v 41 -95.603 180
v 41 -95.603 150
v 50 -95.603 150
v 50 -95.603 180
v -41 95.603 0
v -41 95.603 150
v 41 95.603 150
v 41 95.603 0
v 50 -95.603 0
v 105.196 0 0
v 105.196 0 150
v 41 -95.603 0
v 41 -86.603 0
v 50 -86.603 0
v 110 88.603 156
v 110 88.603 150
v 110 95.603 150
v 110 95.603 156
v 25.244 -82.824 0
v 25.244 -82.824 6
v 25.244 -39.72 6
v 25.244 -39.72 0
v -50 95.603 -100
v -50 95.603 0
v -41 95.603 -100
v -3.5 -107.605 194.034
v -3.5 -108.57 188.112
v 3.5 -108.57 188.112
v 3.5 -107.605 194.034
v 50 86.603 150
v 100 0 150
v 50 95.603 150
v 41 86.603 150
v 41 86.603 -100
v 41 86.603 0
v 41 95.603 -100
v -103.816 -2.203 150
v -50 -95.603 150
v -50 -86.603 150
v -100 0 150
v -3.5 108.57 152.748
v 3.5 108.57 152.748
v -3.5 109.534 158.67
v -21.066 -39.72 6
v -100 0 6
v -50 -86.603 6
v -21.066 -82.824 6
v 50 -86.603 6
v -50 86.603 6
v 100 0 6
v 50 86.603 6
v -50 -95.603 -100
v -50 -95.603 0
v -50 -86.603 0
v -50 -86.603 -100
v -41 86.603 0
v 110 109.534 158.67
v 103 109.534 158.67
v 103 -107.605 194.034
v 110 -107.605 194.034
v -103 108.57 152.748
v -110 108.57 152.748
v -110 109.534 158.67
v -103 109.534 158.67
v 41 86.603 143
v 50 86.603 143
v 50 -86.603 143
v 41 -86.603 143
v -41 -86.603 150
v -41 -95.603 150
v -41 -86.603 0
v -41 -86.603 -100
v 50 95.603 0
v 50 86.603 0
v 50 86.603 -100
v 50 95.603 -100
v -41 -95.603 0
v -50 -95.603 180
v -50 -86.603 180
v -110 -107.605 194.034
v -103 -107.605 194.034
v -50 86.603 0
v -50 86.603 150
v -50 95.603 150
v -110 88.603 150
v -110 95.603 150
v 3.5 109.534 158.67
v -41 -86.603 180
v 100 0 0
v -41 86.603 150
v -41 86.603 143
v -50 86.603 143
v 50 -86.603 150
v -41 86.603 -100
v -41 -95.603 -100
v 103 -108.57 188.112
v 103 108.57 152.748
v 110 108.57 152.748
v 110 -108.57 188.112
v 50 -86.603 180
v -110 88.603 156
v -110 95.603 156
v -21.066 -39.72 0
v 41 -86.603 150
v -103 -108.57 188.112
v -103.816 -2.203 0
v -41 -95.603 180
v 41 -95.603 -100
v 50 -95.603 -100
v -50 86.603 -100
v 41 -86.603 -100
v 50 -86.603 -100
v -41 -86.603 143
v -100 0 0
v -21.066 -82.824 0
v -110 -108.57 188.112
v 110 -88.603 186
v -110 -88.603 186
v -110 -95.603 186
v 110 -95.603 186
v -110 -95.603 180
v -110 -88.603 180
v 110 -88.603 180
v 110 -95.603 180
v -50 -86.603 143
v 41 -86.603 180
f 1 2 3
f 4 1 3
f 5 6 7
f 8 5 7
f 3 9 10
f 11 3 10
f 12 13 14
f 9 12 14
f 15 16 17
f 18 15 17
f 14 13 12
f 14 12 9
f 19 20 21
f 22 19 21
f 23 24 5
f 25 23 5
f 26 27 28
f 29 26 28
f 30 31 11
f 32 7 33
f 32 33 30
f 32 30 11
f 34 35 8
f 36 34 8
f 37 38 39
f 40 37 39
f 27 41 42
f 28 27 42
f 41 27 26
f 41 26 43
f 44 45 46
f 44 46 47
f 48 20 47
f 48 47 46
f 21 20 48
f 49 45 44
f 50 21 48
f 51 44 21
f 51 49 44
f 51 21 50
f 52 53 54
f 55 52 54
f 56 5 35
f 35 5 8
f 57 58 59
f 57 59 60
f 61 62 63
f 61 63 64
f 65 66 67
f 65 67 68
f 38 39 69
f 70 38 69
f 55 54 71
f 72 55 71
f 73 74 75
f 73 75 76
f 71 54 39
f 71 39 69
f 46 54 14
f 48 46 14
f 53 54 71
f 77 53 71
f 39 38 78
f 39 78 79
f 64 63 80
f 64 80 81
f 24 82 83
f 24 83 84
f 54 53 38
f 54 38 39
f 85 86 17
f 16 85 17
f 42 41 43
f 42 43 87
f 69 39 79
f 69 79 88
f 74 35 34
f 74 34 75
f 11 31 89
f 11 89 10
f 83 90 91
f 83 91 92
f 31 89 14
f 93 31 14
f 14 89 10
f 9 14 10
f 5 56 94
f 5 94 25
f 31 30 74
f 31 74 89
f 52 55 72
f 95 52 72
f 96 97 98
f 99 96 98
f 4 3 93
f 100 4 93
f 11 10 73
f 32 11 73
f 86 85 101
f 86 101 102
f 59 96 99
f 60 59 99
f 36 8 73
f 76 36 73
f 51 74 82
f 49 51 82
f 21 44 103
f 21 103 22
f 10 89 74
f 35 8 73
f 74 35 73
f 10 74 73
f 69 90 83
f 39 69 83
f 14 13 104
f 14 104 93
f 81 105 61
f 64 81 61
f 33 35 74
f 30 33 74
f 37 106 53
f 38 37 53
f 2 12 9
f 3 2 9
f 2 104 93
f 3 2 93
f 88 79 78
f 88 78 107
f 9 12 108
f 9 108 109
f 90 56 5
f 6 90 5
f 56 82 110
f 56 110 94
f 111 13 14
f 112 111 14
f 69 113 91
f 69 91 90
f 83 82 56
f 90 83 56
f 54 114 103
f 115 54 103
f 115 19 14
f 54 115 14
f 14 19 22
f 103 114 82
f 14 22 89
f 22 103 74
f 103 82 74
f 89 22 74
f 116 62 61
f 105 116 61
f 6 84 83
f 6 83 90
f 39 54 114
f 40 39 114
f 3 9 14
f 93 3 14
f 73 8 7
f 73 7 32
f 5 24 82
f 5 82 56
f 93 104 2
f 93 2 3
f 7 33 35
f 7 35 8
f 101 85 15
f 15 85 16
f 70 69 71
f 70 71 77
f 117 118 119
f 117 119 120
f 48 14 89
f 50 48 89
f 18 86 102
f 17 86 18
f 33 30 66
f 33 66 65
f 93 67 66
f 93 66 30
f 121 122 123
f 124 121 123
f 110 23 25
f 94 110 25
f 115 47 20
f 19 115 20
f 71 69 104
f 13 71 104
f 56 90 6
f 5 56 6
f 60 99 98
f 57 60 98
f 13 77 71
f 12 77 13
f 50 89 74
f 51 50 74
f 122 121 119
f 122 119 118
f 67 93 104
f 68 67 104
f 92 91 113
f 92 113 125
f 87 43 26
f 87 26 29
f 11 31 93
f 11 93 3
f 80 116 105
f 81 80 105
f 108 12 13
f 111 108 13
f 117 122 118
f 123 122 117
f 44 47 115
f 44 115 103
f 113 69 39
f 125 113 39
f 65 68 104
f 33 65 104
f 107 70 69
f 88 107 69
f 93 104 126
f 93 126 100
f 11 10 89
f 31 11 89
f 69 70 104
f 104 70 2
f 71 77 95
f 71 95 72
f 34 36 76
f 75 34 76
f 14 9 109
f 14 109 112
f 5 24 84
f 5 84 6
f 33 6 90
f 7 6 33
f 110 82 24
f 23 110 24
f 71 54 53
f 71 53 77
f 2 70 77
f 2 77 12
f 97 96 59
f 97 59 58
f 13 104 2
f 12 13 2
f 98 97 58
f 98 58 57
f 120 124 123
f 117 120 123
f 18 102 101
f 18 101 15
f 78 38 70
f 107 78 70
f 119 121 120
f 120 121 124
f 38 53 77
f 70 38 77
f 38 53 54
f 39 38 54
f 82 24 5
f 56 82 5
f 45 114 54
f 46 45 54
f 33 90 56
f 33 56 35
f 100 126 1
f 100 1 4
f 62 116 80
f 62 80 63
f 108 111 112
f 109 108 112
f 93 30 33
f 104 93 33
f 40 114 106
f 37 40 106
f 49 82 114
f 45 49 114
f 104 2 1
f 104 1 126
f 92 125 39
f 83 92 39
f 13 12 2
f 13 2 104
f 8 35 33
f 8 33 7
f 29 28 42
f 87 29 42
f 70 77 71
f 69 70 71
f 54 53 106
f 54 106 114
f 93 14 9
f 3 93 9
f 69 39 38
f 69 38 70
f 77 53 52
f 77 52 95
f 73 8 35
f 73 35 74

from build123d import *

# Parameters (mm, degrees)
F1_DEPTH  = 6
F2_W      = 9
F2_H      = 9
F3_DEPTH  = 150
F5_W      = 82
F5_H      = 9
F6_DEPTH  = 150
F8_DEPTH  = 100
F10_DEPTH = 150
F12_W     = 46.3100634515
F12_H     = 43.1039780378
F13_DEPTH = 6
F16_DEPTH = 150
F17_DEPTH = 150
F18_W     = 9
F18_H     = 7
F19_DEPTH = 173.2050807569
F20_W     = 220
F20_H     = 7
F21_DEPTH = 6
F22_W     = 9
F22_H     = 9
F23_DEPTH = 30
F24_W     = 220
F24_H     = 7
F25_DEPTH = 6
F27_W     = 7
F27_H     = 220
F28_DEPTH = 6


with BuildPart() as f1:
    # F0 (on Top) → F1 (new body)
    with BuildSketch(Plane.XY):
        Polygon((100, 0), (50, 86.6025403784), (-50, 86.6025403784), (-100, 0), (-50, -86.6025403784), (50, -86.6025403784), align=None)
    extrude(amount=F1_DEPTH)

    # F12 (on face) → F13 (cut, through all)
    with BuildSketch(Plane.XY.offset(6)):
        with Locations((2.0888131112, -61.2717717886)):
            Rectangle(F12_W, F12_H)
    extrude(amount=-F13_DEPTH, mode=Mode.SUBTRACT)


with BuildPart() as f3:
    # F2 (on Top) → F3 (new body)
    with BuildSketch(Plane.XY):
        with Locations((-45.5, 91.1025403784)):
            Rectangle(F2_W, F2_H)
    extrude(amount=F3_DEPTH)


with BuildPart() as f3b:
    # F2 (on Top) → F3, piece 2 (new body)
    with BuildSketch(Plane.XY):
        with Locations((45.5, 91.1025403784)):
            Rectangle(F2_W, F2_H)
    extrude(amount=F3_DEPTH)

    # F9 (on offset) → F10 (join)
    with BuildSketch(Plane.XY.offset(150)):
        Polygon((50, 95.6025403784), (50, 86.6025403784), (100, 0), (105.1961524227, 0), align=None)
    extrude(amount=-F10_DEPTH)


with BuildPart() as f3c:
    # F2 (on Top) → F3, piece 3 (new body)
    with BuildSketch(Plane.XY):
        with Locations((-45.5, -91.1025403784)):
            Rectangle(F2_W, F2_H)
    extrude(amount=F3_DEPTH)


with BuildPart() as f3d:
    # F2 (on Top) → F3, piece 4 (new body)
    with BuildSketch(Plane.XY):
        with Locations((45.5, -91.1025403784)):
            Rectangle(F2_W, F2_H)
    extrude(amount=F3_DEPTH)


with BuildPart() as f6:
    # F5 (on offset) → F6 (new body)
    with BuildSketch(Plane.XY.offset(150)):
        with Locations((0, 91.1025403784)):
            Rectangle(F5_W, F5_H)
    extrude(amount=-F6_DEPTH)


with BuildPart() as f7_1:
    # F7: instance of F6
    add(f6.part.mirror(Plane.XZ))


with BuildPart() as f8:
    # F2 (on Top) → F8 (new body)
    with BuildSketch(Plane.XY):
        with Locations((-45.5, 91.1025403784)):
            Rectangle(F2_W, F2_H)
    extrude(amount=-F8_DEPTH)


with BuildPart() as f8b:
    # F2 (on Top) → F8, piece 2 (new body)
    with BuildSketch(Plane.XY):
        with Locations((45.5, 91.1025403784)):
            Rectangle(F2_W, F2_H)
    extrude(amount=-F8_DEPTH)


with BuildPart() as f8c:
    # F2 (on Top) → F8, piece 3 (new body)
    with BuildSketch(Plane.XY):
        with Locations((-45.5, -91.1025403784)):
            Rectangle(F2_W, F2_H)
    extrude(amount=-F8_DEPTH)


with BuildPart() as f8d:
    # F2 (on Top) → F8, piece 4 (new body)
    with BuildSketch(Plane.XY):
        with Locations((45.5, -91.1025403784)):
            Rectangle(F2_W, F2_H)
    extrude(amount=-F8_DEPTH)


with BuildPart() as f16:
    # F14 (on Top) → F16 (new body)
    with BuildSketch(Plane.XY):
        Polygon((105.1961524227, 0), (100, 0), (50, -86.6025403784), (50, -95.6025403784), align=None)
    extrude(amount=F16_DEPTH)


with BuildPart() as f17:
    # F15 (on Top) → F17 (new body)
    with BuildSketch(Plane.XY):
        Polygon((-100, 0), (-103.8159340531, -2.2031305528), (-50, -95.6025403784), (-50, -86.6025403784), align=None)
    extrude(amount=F17_DEPTH)


with BuildPart() as f19:
    # F18 (on face) → F19 (new body, through all)
    with BuildSketch(Plane(origin=(0, -86.6025403784, 0), x_dir=(-1, 0, 0), z_dir=(0, 1, 0))):
        with Locations((45.5, 146.5)):
            Rectangle(F18_W, F18_H)
    extrude(amount=F19_DEPTH)


with BuildPart() as f19b:
    # F18 (on face) → F19, piece 2 (new body, through all)
    with BuildSketch(Plane(origin=(0, -86.6025403784, 0), x_dir=(-1, 0, 0), z_dir=(0, 1, 0))):
        with Locations((-45.5, 146.5)):
            Rectangle(F18_W, F18_H)
    extrude(amount=F19_DEPTH)


with BuildPart() as f21:
    # F20 (on face) → F21 (new body)
    with BuildSketch(Plane.XY.offset(150)):
        with Locations((0, 92.1025403784)):
            Rectangle(F20_W, F20_H)
    extrude(amount=F21_DEPTH)


with BuildPart() as f23:
    # F22 (on face) → F23 (new body)
    with BuildSketch(Plane.XY.offset(150)):
        with Locations((45.5, -91.1025403784)):
            Rectangle(F22_W, F22_H)
    extrude(amount=F23_DEPTH)


with BuildPart() as f23b:
    # F22 (on face) → F23, piece 2 (new body)
    with BuildSketch(Plane.XY.offset(150)):
        with Locations((-45.5, -91.1025403784)):
            Rectangle(F22_W, F22_H)
    extrude(amount=F23_DEPTH)


with BuildPart() as f25:
    # F24 (on face) → F25 (new body)
    with BuildSketch(Plane.XY.offset(180)):
        with Locations((0, -92.1025403784)):
            Rectangle(F24_W, F24_H)
    extrude(amount=F25_DEPTH)


with BuildPart() as f28:
    # F27 (on 3pt) → F28 (new body)
    with BuildSketch(Plane(origin=(0, 27.0393679816, 166.0262987553), x_dir=(1, 0, 0), z_dir=(0, 0.1607441189, 0.9869961136))):
        with Locations((-106.5, -27.3956174795)):
            Rectangle(F27_W, F27_H)
    extrude(amount=F28_DEPTH)


with BuildPart() as f28b:
    # F27 (on 3pt) → F28, piece 2 (new body)
    with BuildSketch(Plane(origin=(0, 27.0393679816, 166.0262987553), x_dir=(1, 0, 0), z_dir=(0, 0.1607441189, 0.9869961136))):
        with Locations((0, -27.3956174795)):
            Rectangle(F27_W, F27_H)
    extrude(amount=F28_DEPTH)


with BuildPart() as f28c:
    # F27 (on 3pt) → F28, piece 3 (new body)
    with BuildSketch(Plane(origin=(0, 27.0393679816, 166.0262987553), x_dir=(1, 0, 0), z_dir=(0, 0.1607441189, 0.9869961136))):
        with Locations((106.5, -27.3956174795)):
            Rectangle(F27_W, F27_H)
    extrude(amount=F28_DEPTH)


solid = Compound([f1.part, f3.part, f3b.part, f3c.part, f3d.part, f6.part, f7_1.part, f8.part, f8b.part, f8c.part, f8d.part, f16.part, f17.part, f19.part, f19b.part, f21.part, f23.part, f23b.part, f25.part, f28.part, f28b.part, f28c.part])
